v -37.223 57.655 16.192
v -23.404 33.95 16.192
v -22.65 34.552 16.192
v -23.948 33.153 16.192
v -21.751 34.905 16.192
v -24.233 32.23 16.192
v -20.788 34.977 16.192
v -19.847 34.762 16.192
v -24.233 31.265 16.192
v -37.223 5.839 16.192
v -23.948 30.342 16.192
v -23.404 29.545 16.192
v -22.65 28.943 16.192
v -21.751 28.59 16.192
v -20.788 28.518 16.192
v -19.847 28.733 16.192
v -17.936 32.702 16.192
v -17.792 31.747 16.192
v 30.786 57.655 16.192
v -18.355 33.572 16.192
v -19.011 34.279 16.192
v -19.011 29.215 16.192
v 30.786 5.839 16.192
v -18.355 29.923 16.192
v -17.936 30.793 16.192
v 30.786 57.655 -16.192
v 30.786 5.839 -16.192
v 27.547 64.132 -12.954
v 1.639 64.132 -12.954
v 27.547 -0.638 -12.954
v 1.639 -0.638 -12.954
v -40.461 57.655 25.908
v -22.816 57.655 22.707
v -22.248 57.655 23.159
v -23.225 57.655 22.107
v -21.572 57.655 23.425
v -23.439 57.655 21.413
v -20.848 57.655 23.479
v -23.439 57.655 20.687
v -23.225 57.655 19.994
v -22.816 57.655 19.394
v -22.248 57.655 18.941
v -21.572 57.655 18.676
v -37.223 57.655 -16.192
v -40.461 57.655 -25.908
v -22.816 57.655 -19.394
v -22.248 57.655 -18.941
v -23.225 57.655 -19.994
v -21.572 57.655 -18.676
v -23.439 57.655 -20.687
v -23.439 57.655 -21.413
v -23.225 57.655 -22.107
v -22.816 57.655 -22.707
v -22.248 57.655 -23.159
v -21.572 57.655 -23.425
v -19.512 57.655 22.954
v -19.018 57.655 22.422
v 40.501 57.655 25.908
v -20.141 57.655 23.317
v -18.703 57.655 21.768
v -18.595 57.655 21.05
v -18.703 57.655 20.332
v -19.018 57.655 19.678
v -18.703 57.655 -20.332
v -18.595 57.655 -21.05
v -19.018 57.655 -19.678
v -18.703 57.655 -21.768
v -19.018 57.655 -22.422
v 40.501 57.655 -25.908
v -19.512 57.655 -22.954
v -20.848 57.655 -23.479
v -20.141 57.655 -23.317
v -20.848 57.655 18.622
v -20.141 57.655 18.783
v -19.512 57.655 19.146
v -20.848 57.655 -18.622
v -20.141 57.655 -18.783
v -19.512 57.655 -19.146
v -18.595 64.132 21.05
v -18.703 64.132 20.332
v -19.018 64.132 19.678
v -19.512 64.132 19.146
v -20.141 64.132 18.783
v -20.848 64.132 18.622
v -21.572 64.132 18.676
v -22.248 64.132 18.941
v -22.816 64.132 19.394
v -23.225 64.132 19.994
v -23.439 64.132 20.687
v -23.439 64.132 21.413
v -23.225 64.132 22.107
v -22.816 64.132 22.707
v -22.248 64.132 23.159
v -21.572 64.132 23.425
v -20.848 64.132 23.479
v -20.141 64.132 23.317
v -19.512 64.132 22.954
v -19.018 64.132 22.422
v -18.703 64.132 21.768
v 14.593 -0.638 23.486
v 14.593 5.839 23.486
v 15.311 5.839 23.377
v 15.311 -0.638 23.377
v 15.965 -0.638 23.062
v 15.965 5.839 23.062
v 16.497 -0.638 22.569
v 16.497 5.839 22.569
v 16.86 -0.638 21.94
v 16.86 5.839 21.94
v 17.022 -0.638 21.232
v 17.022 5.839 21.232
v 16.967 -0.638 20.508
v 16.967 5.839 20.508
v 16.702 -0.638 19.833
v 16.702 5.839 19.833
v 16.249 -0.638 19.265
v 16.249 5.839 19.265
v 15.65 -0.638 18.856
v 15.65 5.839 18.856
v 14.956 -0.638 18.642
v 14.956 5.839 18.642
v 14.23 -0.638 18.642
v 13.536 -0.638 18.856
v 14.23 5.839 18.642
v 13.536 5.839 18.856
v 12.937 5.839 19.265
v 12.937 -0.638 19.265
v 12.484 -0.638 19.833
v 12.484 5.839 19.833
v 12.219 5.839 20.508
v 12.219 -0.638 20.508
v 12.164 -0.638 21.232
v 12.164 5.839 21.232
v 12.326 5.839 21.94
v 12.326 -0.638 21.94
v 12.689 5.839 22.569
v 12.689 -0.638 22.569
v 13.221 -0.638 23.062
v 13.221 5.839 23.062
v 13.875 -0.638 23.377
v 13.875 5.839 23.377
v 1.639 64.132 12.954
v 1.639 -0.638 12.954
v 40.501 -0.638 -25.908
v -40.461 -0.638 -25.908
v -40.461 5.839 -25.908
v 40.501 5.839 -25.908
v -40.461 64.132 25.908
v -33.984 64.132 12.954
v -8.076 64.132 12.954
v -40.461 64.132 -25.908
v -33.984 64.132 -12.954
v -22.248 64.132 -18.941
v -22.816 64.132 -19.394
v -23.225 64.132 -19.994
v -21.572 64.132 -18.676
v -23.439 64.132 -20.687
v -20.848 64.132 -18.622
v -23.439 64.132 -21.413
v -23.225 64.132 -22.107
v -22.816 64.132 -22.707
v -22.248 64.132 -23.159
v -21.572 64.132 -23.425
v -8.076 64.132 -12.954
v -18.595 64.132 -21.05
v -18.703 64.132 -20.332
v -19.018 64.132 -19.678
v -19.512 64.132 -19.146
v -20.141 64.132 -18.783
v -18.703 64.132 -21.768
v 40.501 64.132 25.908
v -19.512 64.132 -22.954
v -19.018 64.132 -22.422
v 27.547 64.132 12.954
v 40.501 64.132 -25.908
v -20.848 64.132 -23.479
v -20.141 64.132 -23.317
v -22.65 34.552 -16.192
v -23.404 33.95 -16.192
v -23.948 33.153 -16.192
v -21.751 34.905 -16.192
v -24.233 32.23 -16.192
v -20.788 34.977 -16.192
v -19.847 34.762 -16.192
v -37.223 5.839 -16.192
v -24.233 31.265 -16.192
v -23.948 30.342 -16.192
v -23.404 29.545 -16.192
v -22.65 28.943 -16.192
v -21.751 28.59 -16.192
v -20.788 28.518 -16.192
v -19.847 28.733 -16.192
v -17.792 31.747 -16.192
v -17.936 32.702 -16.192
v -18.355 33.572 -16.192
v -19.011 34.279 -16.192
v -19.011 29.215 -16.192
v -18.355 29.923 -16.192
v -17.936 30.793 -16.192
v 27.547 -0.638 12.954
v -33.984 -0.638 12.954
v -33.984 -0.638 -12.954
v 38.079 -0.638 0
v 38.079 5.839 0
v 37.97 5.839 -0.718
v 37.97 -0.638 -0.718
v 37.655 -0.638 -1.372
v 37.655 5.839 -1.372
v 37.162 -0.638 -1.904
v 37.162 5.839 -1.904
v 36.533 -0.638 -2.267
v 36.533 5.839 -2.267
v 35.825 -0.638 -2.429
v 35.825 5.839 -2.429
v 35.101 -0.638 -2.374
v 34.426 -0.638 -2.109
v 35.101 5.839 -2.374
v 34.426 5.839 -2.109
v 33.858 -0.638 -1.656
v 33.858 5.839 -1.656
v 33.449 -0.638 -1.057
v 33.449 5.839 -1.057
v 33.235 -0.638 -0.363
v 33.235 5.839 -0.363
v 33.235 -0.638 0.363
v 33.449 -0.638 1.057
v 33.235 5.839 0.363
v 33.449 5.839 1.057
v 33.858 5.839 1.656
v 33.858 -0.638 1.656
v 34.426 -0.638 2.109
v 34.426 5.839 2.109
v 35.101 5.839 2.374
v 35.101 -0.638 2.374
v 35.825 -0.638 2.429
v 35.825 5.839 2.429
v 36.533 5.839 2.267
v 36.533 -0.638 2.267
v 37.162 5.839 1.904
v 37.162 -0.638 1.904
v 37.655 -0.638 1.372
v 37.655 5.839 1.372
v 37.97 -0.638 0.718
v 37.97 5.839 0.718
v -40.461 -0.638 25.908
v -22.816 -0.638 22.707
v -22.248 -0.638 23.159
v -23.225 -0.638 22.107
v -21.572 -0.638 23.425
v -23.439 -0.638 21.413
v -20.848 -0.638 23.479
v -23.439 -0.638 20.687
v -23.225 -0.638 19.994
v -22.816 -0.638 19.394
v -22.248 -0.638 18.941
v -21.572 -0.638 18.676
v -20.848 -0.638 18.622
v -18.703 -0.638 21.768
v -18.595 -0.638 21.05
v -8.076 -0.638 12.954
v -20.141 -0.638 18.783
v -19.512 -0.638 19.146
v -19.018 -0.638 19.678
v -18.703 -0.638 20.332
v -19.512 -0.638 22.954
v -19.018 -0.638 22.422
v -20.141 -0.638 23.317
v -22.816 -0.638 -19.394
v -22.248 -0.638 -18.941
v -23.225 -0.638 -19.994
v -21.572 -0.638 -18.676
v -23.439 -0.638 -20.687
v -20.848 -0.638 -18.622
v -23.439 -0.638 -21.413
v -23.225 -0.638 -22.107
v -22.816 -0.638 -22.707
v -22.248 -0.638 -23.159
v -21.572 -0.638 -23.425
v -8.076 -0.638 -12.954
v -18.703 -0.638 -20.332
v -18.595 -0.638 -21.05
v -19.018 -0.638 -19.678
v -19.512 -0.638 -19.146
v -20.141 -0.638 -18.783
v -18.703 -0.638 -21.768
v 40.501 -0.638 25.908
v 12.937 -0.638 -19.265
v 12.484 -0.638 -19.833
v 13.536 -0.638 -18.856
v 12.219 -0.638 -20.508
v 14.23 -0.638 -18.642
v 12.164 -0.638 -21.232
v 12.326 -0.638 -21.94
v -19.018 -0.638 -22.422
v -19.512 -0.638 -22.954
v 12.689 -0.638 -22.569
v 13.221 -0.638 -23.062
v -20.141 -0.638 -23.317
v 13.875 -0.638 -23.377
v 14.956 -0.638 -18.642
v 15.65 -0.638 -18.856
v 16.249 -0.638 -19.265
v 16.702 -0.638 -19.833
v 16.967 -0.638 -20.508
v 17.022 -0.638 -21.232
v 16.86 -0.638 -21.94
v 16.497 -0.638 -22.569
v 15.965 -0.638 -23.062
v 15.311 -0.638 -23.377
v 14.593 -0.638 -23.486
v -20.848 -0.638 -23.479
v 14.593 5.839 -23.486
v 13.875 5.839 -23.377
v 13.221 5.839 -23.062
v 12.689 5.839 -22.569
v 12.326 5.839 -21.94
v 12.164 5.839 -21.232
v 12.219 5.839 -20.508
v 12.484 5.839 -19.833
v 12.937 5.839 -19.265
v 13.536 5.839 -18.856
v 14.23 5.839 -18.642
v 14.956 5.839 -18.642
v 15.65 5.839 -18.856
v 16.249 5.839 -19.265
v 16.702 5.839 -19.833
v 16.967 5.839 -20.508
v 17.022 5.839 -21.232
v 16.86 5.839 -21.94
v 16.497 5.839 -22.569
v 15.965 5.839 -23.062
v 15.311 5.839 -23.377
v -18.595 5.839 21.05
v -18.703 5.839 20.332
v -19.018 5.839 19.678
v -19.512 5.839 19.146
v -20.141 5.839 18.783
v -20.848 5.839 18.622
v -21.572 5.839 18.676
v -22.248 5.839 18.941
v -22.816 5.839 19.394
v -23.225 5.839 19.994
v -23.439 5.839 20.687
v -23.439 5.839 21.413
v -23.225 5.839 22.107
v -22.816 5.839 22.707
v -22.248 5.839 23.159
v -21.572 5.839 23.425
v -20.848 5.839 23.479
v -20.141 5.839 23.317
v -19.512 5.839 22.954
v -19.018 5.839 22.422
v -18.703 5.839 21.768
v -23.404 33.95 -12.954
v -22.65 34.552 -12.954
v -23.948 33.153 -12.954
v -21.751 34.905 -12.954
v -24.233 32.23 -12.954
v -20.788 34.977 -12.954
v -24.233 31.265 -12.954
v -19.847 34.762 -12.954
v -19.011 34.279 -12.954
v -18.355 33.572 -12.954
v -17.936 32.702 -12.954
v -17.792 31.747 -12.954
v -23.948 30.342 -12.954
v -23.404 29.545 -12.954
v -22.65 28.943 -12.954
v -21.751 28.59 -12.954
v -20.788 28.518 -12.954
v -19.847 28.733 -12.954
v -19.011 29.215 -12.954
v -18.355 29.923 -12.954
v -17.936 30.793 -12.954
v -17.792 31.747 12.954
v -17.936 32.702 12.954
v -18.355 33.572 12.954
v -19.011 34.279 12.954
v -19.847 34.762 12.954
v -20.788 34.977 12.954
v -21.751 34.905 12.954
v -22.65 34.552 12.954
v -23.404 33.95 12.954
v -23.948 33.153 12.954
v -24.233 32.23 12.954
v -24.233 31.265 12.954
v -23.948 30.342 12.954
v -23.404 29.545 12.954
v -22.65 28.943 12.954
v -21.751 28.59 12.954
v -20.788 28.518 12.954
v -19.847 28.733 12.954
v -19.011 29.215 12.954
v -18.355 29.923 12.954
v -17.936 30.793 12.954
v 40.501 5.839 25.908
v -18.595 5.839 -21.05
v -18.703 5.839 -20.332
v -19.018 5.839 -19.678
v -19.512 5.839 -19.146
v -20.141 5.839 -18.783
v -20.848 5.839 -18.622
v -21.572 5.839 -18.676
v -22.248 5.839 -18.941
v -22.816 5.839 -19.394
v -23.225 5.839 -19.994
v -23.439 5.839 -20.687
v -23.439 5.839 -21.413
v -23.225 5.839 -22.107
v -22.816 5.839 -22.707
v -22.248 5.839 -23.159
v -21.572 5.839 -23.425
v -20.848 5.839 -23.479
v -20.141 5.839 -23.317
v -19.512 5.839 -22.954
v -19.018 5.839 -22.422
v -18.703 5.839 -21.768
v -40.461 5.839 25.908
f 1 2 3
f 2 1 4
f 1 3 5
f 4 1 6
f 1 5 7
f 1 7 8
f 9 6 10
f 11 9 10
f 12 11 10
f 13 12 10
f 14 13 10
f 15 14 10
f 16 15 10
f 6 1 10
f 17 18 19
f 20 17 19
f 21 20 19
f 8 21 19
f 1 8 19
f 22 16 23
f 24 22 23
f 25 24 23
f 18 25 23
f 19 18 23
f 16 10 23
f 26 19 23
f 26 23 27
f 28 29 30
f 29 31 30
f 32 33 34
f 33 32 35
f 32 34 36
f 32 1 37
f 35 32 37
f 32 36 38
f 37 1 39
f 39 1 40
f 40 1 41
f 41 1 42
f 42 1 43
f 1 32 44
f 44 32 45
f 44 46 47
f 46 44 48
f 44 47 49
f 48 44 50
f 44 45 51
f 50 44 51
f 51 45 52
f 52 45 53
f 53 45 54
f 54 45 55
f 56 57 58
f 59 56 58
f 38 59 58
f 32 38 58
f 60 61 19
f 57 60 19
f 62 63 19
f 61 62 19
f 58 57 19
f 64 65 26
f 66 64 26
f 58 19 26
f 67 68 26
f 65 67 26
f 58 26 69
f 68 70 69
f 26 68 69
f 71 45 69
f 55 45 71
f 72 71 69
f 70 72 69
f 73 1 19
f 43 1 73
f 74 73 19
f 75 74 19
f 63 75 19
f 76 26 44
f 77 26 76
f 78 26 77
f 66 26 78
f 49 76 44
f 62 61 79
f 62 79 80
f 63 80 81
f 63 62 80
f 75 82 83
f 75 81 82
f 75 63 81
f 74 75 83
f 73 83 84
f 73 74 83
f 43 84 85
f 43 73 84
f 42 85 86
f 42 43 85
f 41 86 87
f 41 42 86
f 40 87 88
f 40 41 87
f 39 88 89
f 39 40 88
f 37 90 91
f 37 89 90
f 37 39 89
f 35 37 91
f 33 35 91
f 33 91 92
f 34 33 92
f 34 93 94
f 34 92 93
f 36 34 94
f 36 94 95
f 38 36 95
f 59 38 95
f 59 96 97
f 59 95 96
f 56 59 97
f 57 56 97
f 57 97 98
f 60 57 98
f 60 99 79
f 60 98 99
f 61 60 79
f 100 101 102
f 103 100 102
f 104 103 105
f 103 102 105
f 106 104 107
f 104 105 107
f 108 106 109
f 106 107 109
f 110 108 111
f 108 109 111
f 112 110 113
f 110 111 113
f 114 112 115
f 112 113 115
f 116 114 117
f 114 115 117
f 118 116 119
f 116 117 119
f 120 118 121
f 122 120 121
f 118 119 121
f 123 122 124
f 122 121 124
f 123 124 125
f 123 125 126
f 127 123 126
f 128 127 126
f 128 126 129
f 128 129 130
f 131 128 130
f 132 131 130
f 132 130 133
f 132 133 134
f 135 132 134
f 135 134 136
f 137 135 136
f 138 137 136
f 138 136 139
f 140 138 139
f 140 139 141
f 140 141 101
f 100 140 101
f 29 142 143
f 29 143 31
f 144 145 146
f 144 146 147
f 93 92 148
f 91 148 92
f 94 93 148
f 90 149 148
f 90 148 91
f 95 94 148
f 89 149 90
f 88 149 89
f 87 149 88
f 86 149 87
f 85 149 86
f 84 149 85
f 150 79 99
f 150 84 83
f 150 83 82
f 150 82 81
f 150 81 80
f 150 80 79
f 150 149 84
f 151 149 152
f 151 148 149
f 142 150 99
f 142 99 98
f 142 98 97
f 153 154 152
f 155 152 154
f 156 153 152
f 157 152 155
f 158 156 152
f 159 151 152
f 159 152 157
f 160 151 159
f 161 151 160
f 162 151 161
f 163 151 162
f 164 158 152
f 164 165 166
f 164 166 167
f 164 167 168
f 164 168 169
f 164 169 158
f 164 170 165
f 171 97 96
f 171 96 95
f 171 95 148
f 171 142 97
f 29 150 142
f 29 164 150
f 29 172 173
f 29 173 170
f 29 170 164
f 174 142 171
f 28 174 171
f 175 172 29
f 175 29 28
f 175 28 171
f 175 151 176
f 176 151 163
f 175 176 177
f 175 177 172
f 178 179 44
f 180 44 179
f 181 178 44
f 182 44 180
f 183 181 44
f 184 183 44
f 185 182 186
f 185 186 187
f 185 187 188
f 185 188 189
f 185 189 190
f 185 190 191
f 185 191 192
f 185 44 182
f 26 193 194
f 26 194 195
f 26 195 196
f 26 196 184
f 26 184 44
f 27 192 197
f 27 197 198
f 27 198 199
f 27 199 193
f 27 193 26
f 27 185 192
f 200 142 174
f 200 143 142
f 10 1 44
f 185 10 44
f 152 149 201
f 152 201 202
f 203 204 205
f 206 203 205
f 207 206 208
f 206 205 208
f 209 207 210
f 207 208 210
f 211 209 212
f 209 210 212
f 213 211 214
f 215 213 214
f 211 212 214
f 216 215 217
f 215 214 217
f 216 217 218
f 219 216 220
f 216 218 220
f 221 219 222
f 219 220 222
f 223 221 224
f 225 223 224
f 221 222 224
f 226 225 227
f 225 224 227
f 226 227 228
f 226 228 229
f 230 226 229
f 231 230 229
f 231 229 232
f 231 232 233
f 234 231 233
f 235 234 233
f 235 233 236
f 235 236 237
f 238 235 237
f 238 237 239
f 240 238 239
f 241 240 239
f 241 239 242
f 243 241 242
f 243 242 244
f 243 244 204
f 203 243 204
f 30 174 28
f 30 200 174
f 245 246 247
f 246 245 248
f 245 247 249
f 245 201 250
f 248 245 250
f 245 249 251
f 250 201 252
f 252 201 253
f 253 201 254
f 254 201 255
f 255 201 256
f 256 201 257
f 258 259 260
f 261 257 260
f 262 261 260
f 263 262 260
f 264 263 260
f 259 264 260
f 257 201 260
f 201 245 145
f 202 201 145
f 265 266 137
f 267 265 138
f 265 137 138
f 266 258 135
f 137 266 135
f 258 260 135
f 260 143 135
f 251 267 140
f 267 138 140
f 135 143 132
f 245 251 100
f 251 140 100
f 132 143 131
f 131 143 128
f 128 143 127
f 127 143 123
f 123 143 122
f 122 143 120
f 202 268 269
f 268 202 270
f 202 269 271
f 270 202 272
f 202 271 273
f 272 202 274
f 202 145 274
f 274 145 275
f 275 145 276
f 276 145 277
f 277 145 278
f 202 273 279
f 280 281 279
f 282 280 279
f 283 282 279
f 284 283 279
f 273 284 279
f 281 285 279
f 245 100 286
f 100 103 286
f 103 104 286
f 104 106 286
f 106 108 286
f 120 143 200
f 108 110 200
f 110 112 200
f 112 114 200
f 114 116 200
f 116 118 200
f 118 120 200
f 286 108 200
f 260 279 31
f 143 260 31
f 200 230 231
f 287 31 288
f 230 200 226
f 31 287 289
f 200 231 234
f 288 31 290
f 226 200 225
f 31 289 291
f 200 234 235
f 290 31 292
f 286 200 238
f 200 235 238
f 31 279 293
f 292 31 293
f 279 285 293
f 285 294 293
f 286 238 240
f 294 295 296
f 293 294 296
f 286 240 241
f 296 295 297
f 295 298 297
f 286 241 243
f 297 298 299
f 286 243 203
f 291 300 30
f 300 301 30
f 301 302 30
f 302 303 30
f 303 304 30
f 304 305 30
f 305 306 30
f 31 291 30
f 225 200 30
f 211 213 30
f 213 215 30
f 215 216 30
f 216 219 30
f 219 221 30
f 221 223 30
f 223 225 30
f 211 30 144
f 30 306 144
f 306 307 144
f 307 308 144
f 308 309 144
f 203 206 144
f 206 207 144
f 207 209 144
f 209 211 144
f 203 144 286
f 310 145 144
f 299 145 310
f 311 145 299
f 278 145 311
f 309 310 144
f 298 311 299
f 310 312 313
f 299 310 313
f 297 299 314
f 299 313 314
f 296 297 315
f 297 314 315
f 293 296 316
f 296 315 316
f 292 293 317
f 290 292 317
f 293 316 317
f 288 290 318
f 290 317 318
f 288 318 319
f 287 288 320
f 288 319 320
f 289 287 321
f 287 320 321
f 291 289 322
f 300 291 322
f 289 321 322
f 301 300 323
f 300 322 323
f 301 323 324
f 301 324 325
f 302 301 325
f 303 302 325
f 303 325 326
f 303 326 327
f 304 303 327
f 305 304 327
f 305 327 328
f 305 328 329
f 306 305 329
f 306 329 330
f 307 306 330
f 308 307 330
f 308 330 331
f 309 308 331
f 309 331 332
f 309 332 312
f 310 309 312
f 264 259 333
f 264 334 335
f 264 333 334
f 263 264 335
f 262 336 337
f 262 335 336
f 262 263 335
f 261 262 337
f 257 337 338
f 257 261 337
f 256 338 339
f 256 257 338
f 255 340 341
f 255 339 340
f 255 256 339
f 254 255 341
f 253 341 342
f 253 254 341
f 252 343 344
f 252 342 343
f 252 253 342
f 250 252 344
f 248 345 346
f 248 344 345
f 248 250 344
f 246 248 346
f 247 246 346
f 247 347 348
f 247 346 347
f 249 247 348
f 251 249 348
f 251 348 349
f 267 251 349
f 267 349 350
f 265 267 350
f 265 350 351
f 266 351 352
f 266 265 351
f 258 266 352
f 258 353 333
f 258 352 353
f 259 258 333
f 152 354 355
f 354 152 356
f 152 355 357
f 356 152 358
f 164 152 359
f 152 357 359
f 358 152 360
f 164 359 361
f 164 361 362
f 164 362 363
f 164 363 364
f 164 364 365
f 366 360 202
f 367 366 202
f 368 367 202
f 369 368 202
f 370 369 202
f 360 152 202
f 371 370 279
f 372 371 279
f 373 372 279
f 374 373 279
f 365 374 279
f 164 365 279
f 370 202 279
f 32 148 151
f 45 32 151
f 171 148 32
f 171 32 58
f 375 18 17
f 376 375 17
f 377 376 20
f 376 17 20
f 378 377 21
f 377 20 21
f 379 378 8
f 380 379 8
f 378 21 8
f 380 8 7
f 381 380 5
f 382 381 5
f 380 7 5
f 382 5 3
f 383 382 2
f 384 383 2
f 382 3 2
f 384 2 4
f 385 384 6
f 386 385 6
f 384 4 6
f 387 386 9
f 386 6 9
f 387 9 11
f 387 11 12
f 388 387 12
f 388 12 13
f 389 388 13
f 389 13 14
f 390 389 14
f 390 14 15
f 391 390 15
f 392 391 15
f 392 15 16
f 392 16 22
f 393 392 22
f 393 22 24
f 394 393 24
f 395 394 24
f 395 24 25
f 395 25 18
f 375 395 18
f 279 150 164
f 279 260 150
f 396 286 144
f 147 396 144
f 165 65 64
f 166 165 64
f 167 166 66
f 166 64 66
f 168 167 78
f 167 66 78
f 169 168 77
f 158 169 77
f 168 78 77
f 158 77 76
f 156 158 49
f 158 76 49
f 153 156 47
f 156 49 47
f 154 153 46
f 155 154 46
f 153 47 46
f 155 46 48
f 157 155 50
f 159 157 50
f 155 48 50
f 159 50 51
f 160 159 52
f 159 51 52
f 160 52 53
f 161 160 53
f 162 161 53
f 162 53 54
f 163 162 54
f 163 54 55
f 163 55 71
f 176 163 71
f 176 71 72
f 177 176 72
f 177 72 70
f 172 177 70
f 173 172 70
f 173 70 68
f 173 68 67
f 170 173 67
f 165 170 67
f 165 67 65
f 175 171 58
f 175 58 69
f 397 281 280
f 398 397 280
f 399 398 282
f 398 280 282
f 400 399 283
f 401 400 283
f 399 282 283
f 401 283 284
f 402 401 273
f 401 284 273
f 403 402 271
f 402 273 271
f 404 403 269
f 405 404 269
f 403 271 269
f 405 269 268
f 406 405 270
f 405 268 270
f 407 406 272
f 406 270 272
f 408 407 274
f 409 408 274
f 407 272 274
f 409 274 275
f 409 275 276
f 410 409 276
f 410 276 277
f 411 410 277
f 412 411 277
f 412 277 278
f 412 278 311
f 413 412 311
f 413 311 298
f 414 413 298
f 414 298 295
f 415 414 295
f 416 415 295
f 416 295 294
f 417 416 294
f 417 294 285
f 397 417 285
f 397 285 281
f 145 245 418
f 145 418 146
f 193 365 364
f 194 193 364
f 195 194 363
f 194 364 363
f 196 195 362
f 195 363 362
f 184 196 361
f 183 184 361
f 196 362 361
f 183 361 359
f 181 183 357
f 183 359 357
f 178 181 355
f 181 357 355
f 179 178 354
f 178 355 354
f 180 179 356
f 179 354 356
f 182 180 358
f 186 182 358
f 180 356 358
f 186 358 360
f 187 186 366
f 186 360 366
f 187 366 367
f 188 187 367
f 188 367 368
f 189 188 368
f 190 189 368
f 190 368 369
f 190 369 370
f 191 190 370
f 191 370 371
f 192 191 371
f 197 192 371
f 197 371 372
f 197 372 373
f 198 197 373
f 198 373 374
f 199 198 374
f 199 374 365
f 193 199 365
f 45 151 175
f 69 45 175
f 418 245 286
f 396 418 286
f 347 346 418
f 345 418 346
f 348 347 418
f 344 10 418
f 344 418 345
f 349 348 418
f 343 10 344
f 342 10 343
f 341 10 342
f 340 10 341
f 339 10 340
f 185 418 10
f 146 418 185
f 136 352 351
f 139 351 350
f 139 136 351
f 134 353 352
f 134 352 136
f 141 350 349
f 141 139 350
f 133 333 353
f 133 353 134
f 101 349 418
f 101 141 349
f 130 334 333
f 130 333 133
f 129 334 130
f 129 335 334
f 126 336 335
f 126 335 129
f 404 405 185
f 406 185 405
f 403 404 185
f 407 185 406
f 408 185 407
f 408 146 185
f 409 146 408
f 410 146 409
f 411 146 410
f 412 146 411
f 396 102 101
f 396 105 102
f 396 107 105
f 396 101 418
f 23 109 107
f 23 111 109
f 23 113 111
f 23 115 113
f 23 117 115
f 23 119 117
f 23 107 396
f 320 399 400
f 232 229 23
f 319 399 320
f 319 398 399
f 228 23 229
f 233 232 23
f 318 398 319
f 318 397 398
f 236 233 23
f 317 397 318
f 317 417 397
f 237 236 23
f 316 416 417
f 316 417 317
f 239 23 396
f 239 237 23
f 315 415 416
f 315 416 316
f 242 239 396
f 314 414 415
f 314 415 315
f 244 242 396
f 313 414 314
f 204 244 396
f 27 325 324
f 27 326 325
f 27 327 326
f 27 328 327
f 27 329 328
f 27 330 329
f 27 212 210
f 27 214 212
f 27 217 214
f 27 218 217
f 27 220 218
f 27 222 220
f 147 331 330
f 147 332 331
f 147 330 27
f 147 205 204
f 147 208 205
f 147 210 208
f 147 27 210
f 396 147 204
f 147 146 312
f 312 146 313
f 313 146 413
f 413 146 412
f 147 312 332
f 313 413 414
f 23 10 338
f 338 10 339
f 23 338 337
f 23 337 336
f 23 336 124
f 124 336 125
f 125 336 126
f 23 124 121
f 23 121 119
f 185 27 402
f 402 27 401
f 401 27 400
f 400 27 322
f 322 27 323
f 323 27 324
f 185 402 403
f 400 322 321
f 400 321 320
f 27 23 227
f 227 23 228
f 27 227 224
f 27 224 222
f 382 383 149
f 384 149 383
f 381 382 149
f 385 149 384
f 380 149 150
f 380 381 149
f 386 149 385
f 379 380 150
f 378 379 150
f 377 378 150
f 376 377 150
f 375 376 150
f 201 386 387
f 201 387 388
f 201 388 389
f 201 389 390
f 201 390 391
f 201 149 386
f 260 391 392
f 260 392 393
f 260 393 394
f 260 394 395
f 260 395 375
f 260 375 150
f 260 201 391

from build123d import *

# Parameters (mm, degrees)
SKETCH2_W               = 79.375
SKETCH2_H               = 50.8
BOSS_EXTRUDE1_DEPTH     = 6.35
SKETCH3_W               = 66.675
SKETCH3_H               = 31.75
SKETCH3_W_2             = 25.4
SKETCH3_H_2             = 25.4
BOSS_EXTRUDE3_DEPTH     = 50.8
SKETCH4_W               = 25.4
SKETCH4_H               = 25.4
CUT_EXTRUDE4_DEPTH      = 7.35
CUT_EXTRUDE4_DEPTH_BACK = 58.15
SKETCH5_R               = 3.175
CUT_EXTRUDE5_DEPTH      = 42.275
SKETCH6_R               = 2.3876
CUT_EXTRUDE6_DEPTH      = 7.35
CIRPATTERN1_COUNT       = 4
CUT_EXTRUDE7_START      = -7.35
SKETCH7_R               = 2.3876
CUT_EXTRUDE7_DEPTH      = 65.5
SCALE1_SCALE            = 1.02


with BuildPart() as part:
    # Sketch2 → Boss-Extrude1 (new body)
    with BuildSketch(Plane(origin=(0, 0, 0), x_dir=(1, 0, 0), z_dir=(0, 1, 0))):
        Rectangle(SKETCH2_W, SKETCH2_H)
    boss_extrude1 = extrude(amount=BOSS_EXTRUDE1_DEPTH)

    # Sketch3 → Boss-Extrude3 (add)
    with BuildSketch(Plane(origin=(0, 6.35, 0), x_dir=(1, 0, 0), z_dir=(0, 1, 0))):
        with Locations((-3.175, 0)):
            Rectangle(SKETCH3_W, SKETCH3_H)
        with Locations((-20.6375, 0)):
            Rectangle(SKETCH3_W_2, SKETCH3_H_2, mode=Mode.SUBTRACT)
        with Locations((14.2875, 0)):
            Rectangle(SKETCH3_W_2, SKETCH3_H_2, mode=Mode.SUBTRACT)
    extrude(amount=BOSS_EXTRUDE3_DEPTH)

    # Mirror1: Boss-Extrude1 across plane
    add(boss_extrude1.mirror(Plane.ZX.offset(31.75)))

    # Sketch4 → Cut-Extrude4 (cut, two sides)
    with BuildSketch(Plane(origin=(0, 57.15, 0), x_dir=(1, 0, 0), z_dir=(0, 1, 0))) as cut_extrude4_sk:
        with Locations((-20.6375, 0)):
            Rectangle(SKETCH4_W, SKETCH4_H)
        with Locations((14.2875, 0)):
            Rectangle(SKETCH4_W, SKETCH4_H)
    extrude(amount=CUT_EXTRUDE4_DEPTH, mode=Mode.SUBTRACT)
    extrude(cut_extrude4_sk.sketch, amount=-CUT_EXTRUDE4_DEPTH_BACK, mode=Mode.SUBTRACT)

    # Sketch5 → Cut-Extrude5 (cut, through all)
    with BuildSketch(Plane.XY.offset(15.875)):
        with Locations((-20.6375, 31.75)):
            Circle(SKETCH5_R)
    extrude(amount=-CUT_EXTRUDE5_DEPTH, mode=Mode.SUBTRACT)

    # Sketch6 → Cut-Extrude6 (cut, through all)
    with BuildSketch(Plane(origin=(0, 6.35, 0), x_dir=(1, 0, 0), z_dir=(0, 1, 0))):
        with Locations((34.925, 0)):
            Circle(SKETCH6_R)
    cut_extrude6 = extrude(amount=-CUT_EXTRUDE6_DEPTH, mode=Mode.SUBTRACT)

    # CirPattern1: Cut-Extrude6 ×4 about axis, 1 skipped
    cirpattern1_axis = Axis((14.2875, 0, 0), (0, 1, 0))
    add([cut_extrude6.rotate(cirpattern1_axis, i * 360 / CIRPATTERN1_COUNT) for i in range(1, CIRPATTERN1_COUNT) if i not in (2,)], mode=Mode.SUBTRACT)

    # Sketch7 → Cut-Extrude7 (cut)
    with BuildSketch(Plane(origin=(0, 6.35, 0), x_dir=(1, 0, 0), z_dir=(0, 1, 0)).offset(CUT_EXTRUDE7_START)):
        with Locations((-20.6375, -20.6375)):
            Circle(SKETCH7_R)
    cut_extrude7 = extrude(amount=CUT_EXTRUDE7_DEPTH, mode=Mode.SUBTRACT)

    # Mirror2: Cut-Extrude7 across plane
    add(cut_extrude7.mirror(Plane.XY), mode=Mode.SUBTRACT)


with BuildPart() as part_1:
    # Scale1: scaled about (-0.988939035, 31.878583861, 0)
    add(part.part.scale(SCALE1_SCALE).moved(Location((0.019778781, -0.637571677, 0))))


solid = part_1.part
